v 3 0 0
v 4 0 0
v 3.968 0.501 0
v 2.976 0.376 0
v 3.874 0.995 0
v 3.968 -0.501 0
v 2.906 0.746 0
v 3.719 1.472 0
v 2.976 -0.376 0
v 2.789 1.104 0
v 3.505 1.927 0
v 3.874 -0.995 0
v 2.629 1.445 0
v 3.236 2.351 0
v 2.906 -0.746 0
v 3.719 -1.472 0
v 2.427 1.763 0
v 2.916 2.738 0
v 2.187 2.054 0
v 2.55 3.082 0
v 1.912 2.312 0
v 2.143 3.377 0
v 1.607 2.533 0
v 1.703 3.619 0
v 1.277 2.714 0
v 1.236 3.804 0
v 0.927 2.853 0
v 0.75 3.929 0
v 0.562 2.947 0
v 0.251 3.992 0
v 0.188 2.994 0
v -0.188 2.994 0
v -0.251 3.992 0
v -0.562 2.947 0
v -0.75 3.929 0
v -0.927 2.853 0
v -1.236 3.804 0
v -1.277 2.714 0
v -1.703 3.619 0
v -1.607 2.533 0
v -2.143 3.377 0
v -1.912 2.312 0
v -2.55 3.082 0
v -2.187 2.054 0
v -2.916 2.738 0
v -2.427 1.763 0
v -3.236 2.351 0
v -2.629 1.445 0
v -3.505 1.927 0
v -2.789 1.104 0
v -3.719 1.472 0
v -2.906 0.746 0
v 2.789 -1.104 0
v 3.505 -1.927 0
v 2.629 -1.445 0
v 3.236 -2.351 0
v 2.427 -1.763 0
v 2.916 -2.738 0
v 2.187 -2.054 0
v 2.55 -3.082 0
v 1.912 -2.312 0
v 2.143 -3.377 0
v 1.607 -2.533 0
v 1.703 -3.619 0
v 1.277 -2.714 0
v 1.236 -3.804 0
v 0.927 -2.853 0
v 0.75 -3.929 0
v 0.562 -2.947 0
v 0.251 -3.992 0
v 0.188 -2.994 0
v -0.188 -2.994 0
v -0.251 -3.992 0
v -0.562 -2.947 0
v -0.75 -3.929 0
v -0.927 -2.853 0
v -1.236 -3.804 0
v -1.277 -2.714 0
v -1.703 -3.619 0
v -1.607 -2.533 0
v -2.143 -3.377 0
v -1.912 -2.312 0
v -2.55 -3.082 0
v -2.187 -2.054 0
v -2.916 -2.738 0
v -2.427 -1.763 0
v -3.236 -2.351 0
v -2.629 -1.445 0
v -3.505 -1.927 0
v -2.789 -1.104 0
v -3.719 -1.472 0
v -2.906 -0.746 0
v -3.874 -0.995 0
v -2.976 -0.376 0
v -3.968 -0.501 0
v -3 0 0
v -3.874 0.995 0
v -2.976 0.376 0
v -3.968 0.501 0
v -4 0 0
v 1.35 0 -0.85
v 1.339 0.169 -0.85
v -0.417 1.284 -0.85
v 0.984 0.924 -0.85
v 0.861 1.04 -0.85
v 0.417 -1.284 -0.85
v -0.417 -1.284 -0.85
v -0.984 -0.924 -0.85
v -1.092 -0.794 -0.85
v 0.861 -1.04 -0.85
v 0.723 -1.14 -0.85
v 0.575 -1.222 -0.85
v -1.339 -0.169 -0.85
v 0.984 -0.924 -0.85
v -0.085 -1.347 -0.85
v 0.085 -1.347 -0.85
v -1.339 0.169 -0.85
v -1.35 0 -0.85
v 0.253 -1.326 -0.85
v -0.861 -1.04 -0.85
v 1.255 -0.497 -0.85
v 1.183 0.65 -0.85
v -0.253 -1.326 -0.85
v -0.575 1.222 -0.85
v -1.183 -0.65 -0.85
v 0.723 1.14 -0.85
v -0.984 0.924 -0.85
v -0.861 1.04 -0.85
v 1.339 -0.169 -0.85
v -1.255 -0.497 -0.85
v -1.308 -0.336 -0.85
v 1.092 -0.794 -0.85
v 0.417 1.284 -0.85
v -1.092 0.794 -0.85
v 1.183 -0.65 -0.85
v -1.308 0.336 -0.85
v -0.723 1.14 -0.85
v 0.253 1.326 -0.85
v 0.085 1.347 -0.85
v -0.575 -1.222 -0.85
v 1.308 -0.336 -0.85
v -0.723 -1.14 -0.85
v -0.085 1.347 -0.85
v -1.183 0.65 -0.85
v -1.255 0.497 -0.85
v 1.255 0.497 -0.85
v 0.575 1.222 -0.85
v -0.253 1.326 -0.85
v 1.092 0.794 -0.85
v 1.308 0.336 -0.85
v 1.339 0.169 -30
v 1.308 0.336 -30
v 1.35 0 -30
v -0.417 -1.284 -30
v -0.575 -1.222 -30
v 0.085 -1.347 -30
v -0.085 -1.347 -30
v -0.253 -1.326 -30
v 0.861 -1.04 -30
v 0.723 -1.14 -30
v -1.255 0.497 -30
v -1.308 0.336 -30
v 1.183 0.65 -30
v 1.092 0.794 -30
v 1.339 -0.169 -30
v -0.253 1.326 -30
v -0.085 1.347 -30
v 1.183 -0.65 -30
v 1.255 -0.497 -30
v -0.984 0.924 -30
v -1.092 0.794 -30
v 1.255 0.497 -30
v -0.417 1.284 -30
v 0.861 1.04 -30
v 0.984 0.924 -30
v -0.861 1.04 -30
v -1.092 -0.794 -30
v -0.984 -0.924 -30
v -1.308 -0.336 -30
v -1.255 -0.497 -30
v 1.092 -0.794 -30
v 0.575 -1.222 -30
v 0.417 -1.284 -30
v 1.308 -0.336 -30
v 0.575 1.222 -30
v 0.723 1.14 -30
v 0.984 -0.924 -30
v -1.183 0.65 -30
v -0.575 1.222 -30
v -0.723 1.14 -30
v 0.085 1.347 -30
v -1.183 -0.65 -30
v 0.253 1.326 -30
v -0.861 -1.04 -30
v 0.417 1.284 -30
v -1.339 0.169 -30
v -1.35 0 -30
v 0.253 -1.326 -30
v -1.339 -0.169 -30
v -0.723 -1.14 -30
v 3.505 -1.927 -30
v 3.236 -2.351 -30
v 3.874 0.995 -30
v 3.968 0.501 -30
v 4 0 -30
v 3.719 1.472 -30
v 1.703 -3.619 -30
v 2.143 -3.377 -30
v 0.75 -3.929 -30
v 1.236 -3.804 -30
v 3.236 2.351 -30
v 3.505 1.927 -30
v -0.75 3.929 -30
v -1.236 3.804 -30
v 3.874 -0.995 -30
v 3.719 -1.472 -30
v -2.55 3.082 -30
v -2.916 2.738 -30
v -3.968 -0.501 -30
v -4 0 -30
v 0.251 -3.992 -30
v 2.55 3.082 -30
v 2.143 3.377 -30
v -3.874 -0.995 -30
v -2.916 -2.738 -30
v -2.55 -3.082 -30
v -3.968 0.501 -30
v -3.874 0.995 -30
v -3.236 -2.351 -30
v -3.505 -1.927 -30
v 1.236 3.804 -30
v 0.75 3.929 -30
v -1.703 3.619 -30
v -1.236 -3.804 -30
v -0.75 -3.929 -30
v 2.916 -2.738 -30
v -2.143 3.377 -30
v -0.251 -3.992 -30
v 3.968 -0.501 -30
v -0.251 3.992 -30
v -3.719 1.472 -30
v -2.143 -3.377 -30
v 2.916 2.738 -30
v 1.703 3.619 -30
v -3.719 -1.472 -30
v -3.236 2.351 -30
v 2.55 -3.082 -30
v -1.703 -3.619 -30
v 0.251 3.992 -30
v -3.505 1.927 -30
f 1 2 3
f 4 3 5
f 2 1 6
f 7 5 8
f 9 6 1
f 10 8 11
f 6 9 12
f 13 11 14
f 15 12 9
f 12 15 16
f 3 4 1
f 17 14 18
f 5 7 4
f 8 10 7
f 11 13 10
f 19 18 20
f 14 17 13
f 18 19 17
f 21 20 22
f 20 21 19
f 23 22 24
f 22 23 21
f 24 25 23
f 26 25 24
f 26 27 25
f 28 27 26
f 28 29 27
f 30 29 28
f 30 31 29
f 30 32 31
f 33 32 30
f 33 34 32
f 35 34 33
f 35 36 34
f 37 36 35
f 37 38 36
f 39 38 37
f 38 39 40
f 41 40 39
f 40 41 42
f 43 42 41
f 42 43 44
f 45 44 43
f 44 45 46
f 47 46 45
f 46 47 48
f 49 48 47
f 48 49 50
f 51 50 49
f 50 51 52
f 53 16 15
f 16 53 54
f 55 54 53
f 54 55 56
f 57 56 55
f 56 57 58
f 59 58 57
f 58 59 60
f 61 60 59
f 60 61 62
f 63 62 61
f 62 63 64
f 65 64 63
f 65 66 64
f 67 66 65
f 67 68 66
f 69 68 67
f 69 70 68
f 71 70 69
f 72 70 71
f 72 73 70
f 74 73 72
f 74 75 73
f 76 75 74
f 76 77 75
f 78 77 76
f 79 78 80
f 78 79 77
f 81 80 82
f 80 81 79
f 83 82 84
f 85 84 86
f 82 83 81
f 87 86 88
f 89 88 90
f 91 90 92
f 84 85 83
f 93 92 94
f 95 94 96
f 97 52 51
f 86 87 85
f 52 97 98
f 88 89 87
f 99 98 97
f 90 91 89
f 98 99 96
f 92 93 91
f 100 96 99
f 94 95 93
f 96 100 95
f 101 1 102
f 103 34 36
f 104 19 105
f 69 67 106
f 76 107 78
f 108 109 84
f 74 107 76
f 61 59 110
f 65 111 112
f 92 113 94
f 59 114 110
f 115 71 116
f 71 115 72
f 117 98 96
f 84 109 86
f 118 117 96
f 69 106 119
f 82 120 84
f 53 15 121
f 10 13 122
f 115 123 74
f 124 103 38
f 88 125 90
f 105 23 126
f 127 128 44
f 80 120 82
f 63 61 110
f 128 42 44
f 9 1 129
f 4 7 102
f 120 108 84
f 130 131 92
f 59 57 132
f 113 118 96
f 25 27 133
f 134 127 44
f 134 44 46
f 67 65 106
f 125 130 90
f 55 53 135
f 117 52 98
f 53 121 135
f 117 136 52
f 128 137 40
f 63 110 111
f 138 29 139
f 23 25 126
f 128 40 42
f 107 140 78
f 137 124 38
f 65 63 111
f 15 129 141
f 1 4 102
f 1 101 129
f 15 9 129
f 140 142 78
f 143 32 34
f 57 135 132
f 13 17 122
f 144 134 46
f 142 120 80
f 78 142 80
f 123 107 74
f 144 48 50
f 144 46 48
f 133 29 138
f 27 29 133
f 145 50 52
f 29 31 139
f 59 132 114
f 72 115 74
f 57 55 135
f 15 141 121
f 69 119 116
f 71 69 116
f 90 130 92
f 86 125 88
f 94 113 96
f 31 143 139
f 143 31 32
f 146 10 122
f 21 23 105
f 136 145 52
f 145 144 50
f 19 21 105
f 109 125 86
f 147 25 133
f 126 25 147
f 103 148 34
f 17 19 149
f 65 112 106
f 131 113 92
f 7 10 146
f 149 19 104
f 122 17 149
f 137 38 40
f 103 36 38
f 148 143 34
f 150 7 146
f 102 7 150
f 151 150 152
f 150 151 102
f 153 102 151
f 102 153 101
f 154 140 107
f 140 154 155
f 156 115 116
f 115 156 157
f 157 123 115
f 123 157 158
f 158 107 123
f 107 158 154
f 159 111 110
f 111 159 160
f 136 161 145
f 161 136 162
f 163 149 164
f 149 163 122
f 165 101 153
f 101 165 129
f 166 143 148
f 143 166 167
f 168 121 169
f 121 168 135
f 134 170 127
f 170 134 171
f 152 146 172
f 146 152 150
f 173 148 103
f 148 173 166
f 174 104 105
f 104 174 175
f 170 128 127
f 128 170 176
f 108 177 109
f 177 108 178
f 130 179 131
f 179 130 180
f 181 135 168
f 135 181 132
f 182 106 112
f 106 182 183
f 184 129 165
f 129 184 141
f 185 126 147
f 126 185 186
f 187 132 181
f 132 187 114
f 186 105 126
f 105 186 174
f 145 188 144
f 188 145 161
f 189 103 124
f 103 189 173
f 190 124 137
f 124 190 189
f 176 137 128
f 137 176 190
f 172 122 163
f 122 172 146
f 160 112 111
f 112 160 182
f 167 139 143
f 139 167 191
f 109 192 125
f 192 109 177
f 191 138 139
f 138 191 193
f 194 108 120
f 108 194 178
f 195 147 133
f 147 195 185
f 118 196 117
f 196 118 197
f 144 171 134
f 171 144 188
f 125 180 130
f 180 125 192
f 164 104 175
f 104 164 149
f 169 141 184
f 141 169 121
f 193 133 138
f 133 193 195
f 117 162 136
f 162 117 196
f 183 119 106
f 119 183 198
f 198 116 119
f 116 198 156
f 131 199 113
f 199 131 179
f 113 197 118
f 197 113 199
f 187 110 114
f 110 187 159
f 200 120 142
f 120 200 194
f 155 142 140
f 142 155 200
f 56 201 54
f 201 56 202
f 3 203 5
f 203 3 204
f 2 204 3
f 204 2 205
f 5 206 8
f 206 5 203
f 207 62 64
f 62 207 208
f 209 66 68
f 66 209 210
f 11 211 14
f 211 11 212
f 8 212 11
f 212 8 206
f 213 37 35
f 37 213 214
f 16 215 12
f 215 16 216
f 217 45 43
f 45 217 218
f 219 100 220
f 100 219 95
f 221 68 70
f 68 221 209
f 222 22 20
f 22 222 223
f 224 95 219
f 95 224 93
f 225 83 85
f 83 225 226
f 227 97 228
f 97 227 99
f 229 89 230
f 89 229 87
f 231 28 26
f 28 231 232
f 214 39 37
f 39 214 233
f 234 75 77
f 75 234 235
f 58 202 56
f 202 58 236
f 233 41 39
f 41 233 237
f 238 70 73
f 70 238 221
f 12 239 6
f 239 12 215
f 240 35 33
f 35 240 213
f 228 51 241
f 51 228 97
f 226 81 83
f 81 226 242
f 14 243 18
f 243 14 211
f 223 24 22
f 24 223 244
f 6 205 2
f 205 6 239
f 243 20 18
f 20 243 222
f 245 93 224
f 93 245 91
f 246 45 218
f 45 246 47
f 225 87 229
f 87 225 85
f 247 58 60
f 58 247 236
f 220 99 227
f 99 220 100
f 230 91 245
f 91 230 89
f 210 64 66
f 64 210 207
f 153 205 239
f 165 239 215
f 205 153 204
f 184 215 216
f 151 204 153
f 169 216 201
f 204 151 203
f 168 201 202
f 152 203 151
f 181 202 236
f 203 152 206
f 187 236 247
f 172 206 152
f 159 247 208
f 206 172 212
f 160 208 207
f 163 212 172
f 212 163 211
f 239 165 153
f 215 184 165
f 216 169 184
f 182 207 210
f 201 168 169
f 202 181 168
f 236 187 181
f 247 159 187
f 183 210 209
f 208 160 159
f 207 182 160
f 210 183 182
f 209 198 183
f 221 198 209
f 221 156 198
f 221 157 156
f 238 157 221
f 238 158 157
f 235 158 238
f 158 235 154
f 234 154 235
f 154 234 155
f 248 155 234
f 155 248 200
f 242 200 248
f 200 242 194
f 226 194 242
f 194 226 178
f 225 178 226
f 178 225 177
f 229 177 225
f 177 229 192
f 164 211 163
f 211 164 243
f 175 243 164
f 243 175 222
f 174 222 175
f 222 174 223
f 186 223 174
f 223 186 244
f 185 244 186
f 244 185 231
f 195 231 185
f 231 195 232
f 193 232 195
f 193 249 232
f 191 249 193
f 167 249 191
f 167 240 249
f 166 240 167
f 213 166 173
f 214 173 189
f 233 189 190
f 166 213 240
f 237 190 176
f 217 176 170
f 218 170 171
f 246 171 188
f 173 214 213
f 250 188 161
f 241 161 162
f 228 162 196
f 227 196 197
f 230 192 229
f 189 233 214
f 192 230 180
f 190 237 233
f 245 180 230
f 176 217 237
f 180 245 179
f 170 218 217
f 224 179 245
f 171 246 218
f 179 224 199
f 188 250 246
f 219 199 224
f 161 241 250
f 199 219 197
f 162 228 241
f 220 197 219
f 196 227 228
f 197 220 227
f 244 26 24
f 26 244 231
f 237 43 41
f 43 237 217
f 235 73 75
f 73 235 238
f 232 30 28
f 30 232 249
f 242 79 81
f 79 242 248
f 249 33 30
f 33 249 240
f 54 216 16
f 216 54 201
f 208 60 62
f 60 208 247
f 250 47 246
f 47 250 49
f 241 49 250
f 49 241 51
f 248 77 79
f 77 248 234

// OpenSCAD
$fn = 50;

difference() {
	union() {
		translate(v = [0, 0, -30.0]) {
			cylinder(h = 30, r = 4.0);
		}
	}
	union() {
		translate(v = [0, 0, 0]) {
			rotate(a = [0, 0, 0]) {
				difference() {
					union() {
						translate(v = [0, 0, -33.0]) {
							cylinder(h = 33, r = 1.0);
						}
						translate(v = [0, 0, -0.85]) {
							cylinder(h = 0.85, r1 = 1.35, r2 = 3.0);
						}
						translate(v = [0, 0, -33.0]) {
							cylinder(h = 33, r = 1.35);
						}
						translate(v = [0, 0, -33.0]) {
							cylinder(h = 33, r = 1.0);
						}
					}
					union();
				}
			}
		}
	}
}
